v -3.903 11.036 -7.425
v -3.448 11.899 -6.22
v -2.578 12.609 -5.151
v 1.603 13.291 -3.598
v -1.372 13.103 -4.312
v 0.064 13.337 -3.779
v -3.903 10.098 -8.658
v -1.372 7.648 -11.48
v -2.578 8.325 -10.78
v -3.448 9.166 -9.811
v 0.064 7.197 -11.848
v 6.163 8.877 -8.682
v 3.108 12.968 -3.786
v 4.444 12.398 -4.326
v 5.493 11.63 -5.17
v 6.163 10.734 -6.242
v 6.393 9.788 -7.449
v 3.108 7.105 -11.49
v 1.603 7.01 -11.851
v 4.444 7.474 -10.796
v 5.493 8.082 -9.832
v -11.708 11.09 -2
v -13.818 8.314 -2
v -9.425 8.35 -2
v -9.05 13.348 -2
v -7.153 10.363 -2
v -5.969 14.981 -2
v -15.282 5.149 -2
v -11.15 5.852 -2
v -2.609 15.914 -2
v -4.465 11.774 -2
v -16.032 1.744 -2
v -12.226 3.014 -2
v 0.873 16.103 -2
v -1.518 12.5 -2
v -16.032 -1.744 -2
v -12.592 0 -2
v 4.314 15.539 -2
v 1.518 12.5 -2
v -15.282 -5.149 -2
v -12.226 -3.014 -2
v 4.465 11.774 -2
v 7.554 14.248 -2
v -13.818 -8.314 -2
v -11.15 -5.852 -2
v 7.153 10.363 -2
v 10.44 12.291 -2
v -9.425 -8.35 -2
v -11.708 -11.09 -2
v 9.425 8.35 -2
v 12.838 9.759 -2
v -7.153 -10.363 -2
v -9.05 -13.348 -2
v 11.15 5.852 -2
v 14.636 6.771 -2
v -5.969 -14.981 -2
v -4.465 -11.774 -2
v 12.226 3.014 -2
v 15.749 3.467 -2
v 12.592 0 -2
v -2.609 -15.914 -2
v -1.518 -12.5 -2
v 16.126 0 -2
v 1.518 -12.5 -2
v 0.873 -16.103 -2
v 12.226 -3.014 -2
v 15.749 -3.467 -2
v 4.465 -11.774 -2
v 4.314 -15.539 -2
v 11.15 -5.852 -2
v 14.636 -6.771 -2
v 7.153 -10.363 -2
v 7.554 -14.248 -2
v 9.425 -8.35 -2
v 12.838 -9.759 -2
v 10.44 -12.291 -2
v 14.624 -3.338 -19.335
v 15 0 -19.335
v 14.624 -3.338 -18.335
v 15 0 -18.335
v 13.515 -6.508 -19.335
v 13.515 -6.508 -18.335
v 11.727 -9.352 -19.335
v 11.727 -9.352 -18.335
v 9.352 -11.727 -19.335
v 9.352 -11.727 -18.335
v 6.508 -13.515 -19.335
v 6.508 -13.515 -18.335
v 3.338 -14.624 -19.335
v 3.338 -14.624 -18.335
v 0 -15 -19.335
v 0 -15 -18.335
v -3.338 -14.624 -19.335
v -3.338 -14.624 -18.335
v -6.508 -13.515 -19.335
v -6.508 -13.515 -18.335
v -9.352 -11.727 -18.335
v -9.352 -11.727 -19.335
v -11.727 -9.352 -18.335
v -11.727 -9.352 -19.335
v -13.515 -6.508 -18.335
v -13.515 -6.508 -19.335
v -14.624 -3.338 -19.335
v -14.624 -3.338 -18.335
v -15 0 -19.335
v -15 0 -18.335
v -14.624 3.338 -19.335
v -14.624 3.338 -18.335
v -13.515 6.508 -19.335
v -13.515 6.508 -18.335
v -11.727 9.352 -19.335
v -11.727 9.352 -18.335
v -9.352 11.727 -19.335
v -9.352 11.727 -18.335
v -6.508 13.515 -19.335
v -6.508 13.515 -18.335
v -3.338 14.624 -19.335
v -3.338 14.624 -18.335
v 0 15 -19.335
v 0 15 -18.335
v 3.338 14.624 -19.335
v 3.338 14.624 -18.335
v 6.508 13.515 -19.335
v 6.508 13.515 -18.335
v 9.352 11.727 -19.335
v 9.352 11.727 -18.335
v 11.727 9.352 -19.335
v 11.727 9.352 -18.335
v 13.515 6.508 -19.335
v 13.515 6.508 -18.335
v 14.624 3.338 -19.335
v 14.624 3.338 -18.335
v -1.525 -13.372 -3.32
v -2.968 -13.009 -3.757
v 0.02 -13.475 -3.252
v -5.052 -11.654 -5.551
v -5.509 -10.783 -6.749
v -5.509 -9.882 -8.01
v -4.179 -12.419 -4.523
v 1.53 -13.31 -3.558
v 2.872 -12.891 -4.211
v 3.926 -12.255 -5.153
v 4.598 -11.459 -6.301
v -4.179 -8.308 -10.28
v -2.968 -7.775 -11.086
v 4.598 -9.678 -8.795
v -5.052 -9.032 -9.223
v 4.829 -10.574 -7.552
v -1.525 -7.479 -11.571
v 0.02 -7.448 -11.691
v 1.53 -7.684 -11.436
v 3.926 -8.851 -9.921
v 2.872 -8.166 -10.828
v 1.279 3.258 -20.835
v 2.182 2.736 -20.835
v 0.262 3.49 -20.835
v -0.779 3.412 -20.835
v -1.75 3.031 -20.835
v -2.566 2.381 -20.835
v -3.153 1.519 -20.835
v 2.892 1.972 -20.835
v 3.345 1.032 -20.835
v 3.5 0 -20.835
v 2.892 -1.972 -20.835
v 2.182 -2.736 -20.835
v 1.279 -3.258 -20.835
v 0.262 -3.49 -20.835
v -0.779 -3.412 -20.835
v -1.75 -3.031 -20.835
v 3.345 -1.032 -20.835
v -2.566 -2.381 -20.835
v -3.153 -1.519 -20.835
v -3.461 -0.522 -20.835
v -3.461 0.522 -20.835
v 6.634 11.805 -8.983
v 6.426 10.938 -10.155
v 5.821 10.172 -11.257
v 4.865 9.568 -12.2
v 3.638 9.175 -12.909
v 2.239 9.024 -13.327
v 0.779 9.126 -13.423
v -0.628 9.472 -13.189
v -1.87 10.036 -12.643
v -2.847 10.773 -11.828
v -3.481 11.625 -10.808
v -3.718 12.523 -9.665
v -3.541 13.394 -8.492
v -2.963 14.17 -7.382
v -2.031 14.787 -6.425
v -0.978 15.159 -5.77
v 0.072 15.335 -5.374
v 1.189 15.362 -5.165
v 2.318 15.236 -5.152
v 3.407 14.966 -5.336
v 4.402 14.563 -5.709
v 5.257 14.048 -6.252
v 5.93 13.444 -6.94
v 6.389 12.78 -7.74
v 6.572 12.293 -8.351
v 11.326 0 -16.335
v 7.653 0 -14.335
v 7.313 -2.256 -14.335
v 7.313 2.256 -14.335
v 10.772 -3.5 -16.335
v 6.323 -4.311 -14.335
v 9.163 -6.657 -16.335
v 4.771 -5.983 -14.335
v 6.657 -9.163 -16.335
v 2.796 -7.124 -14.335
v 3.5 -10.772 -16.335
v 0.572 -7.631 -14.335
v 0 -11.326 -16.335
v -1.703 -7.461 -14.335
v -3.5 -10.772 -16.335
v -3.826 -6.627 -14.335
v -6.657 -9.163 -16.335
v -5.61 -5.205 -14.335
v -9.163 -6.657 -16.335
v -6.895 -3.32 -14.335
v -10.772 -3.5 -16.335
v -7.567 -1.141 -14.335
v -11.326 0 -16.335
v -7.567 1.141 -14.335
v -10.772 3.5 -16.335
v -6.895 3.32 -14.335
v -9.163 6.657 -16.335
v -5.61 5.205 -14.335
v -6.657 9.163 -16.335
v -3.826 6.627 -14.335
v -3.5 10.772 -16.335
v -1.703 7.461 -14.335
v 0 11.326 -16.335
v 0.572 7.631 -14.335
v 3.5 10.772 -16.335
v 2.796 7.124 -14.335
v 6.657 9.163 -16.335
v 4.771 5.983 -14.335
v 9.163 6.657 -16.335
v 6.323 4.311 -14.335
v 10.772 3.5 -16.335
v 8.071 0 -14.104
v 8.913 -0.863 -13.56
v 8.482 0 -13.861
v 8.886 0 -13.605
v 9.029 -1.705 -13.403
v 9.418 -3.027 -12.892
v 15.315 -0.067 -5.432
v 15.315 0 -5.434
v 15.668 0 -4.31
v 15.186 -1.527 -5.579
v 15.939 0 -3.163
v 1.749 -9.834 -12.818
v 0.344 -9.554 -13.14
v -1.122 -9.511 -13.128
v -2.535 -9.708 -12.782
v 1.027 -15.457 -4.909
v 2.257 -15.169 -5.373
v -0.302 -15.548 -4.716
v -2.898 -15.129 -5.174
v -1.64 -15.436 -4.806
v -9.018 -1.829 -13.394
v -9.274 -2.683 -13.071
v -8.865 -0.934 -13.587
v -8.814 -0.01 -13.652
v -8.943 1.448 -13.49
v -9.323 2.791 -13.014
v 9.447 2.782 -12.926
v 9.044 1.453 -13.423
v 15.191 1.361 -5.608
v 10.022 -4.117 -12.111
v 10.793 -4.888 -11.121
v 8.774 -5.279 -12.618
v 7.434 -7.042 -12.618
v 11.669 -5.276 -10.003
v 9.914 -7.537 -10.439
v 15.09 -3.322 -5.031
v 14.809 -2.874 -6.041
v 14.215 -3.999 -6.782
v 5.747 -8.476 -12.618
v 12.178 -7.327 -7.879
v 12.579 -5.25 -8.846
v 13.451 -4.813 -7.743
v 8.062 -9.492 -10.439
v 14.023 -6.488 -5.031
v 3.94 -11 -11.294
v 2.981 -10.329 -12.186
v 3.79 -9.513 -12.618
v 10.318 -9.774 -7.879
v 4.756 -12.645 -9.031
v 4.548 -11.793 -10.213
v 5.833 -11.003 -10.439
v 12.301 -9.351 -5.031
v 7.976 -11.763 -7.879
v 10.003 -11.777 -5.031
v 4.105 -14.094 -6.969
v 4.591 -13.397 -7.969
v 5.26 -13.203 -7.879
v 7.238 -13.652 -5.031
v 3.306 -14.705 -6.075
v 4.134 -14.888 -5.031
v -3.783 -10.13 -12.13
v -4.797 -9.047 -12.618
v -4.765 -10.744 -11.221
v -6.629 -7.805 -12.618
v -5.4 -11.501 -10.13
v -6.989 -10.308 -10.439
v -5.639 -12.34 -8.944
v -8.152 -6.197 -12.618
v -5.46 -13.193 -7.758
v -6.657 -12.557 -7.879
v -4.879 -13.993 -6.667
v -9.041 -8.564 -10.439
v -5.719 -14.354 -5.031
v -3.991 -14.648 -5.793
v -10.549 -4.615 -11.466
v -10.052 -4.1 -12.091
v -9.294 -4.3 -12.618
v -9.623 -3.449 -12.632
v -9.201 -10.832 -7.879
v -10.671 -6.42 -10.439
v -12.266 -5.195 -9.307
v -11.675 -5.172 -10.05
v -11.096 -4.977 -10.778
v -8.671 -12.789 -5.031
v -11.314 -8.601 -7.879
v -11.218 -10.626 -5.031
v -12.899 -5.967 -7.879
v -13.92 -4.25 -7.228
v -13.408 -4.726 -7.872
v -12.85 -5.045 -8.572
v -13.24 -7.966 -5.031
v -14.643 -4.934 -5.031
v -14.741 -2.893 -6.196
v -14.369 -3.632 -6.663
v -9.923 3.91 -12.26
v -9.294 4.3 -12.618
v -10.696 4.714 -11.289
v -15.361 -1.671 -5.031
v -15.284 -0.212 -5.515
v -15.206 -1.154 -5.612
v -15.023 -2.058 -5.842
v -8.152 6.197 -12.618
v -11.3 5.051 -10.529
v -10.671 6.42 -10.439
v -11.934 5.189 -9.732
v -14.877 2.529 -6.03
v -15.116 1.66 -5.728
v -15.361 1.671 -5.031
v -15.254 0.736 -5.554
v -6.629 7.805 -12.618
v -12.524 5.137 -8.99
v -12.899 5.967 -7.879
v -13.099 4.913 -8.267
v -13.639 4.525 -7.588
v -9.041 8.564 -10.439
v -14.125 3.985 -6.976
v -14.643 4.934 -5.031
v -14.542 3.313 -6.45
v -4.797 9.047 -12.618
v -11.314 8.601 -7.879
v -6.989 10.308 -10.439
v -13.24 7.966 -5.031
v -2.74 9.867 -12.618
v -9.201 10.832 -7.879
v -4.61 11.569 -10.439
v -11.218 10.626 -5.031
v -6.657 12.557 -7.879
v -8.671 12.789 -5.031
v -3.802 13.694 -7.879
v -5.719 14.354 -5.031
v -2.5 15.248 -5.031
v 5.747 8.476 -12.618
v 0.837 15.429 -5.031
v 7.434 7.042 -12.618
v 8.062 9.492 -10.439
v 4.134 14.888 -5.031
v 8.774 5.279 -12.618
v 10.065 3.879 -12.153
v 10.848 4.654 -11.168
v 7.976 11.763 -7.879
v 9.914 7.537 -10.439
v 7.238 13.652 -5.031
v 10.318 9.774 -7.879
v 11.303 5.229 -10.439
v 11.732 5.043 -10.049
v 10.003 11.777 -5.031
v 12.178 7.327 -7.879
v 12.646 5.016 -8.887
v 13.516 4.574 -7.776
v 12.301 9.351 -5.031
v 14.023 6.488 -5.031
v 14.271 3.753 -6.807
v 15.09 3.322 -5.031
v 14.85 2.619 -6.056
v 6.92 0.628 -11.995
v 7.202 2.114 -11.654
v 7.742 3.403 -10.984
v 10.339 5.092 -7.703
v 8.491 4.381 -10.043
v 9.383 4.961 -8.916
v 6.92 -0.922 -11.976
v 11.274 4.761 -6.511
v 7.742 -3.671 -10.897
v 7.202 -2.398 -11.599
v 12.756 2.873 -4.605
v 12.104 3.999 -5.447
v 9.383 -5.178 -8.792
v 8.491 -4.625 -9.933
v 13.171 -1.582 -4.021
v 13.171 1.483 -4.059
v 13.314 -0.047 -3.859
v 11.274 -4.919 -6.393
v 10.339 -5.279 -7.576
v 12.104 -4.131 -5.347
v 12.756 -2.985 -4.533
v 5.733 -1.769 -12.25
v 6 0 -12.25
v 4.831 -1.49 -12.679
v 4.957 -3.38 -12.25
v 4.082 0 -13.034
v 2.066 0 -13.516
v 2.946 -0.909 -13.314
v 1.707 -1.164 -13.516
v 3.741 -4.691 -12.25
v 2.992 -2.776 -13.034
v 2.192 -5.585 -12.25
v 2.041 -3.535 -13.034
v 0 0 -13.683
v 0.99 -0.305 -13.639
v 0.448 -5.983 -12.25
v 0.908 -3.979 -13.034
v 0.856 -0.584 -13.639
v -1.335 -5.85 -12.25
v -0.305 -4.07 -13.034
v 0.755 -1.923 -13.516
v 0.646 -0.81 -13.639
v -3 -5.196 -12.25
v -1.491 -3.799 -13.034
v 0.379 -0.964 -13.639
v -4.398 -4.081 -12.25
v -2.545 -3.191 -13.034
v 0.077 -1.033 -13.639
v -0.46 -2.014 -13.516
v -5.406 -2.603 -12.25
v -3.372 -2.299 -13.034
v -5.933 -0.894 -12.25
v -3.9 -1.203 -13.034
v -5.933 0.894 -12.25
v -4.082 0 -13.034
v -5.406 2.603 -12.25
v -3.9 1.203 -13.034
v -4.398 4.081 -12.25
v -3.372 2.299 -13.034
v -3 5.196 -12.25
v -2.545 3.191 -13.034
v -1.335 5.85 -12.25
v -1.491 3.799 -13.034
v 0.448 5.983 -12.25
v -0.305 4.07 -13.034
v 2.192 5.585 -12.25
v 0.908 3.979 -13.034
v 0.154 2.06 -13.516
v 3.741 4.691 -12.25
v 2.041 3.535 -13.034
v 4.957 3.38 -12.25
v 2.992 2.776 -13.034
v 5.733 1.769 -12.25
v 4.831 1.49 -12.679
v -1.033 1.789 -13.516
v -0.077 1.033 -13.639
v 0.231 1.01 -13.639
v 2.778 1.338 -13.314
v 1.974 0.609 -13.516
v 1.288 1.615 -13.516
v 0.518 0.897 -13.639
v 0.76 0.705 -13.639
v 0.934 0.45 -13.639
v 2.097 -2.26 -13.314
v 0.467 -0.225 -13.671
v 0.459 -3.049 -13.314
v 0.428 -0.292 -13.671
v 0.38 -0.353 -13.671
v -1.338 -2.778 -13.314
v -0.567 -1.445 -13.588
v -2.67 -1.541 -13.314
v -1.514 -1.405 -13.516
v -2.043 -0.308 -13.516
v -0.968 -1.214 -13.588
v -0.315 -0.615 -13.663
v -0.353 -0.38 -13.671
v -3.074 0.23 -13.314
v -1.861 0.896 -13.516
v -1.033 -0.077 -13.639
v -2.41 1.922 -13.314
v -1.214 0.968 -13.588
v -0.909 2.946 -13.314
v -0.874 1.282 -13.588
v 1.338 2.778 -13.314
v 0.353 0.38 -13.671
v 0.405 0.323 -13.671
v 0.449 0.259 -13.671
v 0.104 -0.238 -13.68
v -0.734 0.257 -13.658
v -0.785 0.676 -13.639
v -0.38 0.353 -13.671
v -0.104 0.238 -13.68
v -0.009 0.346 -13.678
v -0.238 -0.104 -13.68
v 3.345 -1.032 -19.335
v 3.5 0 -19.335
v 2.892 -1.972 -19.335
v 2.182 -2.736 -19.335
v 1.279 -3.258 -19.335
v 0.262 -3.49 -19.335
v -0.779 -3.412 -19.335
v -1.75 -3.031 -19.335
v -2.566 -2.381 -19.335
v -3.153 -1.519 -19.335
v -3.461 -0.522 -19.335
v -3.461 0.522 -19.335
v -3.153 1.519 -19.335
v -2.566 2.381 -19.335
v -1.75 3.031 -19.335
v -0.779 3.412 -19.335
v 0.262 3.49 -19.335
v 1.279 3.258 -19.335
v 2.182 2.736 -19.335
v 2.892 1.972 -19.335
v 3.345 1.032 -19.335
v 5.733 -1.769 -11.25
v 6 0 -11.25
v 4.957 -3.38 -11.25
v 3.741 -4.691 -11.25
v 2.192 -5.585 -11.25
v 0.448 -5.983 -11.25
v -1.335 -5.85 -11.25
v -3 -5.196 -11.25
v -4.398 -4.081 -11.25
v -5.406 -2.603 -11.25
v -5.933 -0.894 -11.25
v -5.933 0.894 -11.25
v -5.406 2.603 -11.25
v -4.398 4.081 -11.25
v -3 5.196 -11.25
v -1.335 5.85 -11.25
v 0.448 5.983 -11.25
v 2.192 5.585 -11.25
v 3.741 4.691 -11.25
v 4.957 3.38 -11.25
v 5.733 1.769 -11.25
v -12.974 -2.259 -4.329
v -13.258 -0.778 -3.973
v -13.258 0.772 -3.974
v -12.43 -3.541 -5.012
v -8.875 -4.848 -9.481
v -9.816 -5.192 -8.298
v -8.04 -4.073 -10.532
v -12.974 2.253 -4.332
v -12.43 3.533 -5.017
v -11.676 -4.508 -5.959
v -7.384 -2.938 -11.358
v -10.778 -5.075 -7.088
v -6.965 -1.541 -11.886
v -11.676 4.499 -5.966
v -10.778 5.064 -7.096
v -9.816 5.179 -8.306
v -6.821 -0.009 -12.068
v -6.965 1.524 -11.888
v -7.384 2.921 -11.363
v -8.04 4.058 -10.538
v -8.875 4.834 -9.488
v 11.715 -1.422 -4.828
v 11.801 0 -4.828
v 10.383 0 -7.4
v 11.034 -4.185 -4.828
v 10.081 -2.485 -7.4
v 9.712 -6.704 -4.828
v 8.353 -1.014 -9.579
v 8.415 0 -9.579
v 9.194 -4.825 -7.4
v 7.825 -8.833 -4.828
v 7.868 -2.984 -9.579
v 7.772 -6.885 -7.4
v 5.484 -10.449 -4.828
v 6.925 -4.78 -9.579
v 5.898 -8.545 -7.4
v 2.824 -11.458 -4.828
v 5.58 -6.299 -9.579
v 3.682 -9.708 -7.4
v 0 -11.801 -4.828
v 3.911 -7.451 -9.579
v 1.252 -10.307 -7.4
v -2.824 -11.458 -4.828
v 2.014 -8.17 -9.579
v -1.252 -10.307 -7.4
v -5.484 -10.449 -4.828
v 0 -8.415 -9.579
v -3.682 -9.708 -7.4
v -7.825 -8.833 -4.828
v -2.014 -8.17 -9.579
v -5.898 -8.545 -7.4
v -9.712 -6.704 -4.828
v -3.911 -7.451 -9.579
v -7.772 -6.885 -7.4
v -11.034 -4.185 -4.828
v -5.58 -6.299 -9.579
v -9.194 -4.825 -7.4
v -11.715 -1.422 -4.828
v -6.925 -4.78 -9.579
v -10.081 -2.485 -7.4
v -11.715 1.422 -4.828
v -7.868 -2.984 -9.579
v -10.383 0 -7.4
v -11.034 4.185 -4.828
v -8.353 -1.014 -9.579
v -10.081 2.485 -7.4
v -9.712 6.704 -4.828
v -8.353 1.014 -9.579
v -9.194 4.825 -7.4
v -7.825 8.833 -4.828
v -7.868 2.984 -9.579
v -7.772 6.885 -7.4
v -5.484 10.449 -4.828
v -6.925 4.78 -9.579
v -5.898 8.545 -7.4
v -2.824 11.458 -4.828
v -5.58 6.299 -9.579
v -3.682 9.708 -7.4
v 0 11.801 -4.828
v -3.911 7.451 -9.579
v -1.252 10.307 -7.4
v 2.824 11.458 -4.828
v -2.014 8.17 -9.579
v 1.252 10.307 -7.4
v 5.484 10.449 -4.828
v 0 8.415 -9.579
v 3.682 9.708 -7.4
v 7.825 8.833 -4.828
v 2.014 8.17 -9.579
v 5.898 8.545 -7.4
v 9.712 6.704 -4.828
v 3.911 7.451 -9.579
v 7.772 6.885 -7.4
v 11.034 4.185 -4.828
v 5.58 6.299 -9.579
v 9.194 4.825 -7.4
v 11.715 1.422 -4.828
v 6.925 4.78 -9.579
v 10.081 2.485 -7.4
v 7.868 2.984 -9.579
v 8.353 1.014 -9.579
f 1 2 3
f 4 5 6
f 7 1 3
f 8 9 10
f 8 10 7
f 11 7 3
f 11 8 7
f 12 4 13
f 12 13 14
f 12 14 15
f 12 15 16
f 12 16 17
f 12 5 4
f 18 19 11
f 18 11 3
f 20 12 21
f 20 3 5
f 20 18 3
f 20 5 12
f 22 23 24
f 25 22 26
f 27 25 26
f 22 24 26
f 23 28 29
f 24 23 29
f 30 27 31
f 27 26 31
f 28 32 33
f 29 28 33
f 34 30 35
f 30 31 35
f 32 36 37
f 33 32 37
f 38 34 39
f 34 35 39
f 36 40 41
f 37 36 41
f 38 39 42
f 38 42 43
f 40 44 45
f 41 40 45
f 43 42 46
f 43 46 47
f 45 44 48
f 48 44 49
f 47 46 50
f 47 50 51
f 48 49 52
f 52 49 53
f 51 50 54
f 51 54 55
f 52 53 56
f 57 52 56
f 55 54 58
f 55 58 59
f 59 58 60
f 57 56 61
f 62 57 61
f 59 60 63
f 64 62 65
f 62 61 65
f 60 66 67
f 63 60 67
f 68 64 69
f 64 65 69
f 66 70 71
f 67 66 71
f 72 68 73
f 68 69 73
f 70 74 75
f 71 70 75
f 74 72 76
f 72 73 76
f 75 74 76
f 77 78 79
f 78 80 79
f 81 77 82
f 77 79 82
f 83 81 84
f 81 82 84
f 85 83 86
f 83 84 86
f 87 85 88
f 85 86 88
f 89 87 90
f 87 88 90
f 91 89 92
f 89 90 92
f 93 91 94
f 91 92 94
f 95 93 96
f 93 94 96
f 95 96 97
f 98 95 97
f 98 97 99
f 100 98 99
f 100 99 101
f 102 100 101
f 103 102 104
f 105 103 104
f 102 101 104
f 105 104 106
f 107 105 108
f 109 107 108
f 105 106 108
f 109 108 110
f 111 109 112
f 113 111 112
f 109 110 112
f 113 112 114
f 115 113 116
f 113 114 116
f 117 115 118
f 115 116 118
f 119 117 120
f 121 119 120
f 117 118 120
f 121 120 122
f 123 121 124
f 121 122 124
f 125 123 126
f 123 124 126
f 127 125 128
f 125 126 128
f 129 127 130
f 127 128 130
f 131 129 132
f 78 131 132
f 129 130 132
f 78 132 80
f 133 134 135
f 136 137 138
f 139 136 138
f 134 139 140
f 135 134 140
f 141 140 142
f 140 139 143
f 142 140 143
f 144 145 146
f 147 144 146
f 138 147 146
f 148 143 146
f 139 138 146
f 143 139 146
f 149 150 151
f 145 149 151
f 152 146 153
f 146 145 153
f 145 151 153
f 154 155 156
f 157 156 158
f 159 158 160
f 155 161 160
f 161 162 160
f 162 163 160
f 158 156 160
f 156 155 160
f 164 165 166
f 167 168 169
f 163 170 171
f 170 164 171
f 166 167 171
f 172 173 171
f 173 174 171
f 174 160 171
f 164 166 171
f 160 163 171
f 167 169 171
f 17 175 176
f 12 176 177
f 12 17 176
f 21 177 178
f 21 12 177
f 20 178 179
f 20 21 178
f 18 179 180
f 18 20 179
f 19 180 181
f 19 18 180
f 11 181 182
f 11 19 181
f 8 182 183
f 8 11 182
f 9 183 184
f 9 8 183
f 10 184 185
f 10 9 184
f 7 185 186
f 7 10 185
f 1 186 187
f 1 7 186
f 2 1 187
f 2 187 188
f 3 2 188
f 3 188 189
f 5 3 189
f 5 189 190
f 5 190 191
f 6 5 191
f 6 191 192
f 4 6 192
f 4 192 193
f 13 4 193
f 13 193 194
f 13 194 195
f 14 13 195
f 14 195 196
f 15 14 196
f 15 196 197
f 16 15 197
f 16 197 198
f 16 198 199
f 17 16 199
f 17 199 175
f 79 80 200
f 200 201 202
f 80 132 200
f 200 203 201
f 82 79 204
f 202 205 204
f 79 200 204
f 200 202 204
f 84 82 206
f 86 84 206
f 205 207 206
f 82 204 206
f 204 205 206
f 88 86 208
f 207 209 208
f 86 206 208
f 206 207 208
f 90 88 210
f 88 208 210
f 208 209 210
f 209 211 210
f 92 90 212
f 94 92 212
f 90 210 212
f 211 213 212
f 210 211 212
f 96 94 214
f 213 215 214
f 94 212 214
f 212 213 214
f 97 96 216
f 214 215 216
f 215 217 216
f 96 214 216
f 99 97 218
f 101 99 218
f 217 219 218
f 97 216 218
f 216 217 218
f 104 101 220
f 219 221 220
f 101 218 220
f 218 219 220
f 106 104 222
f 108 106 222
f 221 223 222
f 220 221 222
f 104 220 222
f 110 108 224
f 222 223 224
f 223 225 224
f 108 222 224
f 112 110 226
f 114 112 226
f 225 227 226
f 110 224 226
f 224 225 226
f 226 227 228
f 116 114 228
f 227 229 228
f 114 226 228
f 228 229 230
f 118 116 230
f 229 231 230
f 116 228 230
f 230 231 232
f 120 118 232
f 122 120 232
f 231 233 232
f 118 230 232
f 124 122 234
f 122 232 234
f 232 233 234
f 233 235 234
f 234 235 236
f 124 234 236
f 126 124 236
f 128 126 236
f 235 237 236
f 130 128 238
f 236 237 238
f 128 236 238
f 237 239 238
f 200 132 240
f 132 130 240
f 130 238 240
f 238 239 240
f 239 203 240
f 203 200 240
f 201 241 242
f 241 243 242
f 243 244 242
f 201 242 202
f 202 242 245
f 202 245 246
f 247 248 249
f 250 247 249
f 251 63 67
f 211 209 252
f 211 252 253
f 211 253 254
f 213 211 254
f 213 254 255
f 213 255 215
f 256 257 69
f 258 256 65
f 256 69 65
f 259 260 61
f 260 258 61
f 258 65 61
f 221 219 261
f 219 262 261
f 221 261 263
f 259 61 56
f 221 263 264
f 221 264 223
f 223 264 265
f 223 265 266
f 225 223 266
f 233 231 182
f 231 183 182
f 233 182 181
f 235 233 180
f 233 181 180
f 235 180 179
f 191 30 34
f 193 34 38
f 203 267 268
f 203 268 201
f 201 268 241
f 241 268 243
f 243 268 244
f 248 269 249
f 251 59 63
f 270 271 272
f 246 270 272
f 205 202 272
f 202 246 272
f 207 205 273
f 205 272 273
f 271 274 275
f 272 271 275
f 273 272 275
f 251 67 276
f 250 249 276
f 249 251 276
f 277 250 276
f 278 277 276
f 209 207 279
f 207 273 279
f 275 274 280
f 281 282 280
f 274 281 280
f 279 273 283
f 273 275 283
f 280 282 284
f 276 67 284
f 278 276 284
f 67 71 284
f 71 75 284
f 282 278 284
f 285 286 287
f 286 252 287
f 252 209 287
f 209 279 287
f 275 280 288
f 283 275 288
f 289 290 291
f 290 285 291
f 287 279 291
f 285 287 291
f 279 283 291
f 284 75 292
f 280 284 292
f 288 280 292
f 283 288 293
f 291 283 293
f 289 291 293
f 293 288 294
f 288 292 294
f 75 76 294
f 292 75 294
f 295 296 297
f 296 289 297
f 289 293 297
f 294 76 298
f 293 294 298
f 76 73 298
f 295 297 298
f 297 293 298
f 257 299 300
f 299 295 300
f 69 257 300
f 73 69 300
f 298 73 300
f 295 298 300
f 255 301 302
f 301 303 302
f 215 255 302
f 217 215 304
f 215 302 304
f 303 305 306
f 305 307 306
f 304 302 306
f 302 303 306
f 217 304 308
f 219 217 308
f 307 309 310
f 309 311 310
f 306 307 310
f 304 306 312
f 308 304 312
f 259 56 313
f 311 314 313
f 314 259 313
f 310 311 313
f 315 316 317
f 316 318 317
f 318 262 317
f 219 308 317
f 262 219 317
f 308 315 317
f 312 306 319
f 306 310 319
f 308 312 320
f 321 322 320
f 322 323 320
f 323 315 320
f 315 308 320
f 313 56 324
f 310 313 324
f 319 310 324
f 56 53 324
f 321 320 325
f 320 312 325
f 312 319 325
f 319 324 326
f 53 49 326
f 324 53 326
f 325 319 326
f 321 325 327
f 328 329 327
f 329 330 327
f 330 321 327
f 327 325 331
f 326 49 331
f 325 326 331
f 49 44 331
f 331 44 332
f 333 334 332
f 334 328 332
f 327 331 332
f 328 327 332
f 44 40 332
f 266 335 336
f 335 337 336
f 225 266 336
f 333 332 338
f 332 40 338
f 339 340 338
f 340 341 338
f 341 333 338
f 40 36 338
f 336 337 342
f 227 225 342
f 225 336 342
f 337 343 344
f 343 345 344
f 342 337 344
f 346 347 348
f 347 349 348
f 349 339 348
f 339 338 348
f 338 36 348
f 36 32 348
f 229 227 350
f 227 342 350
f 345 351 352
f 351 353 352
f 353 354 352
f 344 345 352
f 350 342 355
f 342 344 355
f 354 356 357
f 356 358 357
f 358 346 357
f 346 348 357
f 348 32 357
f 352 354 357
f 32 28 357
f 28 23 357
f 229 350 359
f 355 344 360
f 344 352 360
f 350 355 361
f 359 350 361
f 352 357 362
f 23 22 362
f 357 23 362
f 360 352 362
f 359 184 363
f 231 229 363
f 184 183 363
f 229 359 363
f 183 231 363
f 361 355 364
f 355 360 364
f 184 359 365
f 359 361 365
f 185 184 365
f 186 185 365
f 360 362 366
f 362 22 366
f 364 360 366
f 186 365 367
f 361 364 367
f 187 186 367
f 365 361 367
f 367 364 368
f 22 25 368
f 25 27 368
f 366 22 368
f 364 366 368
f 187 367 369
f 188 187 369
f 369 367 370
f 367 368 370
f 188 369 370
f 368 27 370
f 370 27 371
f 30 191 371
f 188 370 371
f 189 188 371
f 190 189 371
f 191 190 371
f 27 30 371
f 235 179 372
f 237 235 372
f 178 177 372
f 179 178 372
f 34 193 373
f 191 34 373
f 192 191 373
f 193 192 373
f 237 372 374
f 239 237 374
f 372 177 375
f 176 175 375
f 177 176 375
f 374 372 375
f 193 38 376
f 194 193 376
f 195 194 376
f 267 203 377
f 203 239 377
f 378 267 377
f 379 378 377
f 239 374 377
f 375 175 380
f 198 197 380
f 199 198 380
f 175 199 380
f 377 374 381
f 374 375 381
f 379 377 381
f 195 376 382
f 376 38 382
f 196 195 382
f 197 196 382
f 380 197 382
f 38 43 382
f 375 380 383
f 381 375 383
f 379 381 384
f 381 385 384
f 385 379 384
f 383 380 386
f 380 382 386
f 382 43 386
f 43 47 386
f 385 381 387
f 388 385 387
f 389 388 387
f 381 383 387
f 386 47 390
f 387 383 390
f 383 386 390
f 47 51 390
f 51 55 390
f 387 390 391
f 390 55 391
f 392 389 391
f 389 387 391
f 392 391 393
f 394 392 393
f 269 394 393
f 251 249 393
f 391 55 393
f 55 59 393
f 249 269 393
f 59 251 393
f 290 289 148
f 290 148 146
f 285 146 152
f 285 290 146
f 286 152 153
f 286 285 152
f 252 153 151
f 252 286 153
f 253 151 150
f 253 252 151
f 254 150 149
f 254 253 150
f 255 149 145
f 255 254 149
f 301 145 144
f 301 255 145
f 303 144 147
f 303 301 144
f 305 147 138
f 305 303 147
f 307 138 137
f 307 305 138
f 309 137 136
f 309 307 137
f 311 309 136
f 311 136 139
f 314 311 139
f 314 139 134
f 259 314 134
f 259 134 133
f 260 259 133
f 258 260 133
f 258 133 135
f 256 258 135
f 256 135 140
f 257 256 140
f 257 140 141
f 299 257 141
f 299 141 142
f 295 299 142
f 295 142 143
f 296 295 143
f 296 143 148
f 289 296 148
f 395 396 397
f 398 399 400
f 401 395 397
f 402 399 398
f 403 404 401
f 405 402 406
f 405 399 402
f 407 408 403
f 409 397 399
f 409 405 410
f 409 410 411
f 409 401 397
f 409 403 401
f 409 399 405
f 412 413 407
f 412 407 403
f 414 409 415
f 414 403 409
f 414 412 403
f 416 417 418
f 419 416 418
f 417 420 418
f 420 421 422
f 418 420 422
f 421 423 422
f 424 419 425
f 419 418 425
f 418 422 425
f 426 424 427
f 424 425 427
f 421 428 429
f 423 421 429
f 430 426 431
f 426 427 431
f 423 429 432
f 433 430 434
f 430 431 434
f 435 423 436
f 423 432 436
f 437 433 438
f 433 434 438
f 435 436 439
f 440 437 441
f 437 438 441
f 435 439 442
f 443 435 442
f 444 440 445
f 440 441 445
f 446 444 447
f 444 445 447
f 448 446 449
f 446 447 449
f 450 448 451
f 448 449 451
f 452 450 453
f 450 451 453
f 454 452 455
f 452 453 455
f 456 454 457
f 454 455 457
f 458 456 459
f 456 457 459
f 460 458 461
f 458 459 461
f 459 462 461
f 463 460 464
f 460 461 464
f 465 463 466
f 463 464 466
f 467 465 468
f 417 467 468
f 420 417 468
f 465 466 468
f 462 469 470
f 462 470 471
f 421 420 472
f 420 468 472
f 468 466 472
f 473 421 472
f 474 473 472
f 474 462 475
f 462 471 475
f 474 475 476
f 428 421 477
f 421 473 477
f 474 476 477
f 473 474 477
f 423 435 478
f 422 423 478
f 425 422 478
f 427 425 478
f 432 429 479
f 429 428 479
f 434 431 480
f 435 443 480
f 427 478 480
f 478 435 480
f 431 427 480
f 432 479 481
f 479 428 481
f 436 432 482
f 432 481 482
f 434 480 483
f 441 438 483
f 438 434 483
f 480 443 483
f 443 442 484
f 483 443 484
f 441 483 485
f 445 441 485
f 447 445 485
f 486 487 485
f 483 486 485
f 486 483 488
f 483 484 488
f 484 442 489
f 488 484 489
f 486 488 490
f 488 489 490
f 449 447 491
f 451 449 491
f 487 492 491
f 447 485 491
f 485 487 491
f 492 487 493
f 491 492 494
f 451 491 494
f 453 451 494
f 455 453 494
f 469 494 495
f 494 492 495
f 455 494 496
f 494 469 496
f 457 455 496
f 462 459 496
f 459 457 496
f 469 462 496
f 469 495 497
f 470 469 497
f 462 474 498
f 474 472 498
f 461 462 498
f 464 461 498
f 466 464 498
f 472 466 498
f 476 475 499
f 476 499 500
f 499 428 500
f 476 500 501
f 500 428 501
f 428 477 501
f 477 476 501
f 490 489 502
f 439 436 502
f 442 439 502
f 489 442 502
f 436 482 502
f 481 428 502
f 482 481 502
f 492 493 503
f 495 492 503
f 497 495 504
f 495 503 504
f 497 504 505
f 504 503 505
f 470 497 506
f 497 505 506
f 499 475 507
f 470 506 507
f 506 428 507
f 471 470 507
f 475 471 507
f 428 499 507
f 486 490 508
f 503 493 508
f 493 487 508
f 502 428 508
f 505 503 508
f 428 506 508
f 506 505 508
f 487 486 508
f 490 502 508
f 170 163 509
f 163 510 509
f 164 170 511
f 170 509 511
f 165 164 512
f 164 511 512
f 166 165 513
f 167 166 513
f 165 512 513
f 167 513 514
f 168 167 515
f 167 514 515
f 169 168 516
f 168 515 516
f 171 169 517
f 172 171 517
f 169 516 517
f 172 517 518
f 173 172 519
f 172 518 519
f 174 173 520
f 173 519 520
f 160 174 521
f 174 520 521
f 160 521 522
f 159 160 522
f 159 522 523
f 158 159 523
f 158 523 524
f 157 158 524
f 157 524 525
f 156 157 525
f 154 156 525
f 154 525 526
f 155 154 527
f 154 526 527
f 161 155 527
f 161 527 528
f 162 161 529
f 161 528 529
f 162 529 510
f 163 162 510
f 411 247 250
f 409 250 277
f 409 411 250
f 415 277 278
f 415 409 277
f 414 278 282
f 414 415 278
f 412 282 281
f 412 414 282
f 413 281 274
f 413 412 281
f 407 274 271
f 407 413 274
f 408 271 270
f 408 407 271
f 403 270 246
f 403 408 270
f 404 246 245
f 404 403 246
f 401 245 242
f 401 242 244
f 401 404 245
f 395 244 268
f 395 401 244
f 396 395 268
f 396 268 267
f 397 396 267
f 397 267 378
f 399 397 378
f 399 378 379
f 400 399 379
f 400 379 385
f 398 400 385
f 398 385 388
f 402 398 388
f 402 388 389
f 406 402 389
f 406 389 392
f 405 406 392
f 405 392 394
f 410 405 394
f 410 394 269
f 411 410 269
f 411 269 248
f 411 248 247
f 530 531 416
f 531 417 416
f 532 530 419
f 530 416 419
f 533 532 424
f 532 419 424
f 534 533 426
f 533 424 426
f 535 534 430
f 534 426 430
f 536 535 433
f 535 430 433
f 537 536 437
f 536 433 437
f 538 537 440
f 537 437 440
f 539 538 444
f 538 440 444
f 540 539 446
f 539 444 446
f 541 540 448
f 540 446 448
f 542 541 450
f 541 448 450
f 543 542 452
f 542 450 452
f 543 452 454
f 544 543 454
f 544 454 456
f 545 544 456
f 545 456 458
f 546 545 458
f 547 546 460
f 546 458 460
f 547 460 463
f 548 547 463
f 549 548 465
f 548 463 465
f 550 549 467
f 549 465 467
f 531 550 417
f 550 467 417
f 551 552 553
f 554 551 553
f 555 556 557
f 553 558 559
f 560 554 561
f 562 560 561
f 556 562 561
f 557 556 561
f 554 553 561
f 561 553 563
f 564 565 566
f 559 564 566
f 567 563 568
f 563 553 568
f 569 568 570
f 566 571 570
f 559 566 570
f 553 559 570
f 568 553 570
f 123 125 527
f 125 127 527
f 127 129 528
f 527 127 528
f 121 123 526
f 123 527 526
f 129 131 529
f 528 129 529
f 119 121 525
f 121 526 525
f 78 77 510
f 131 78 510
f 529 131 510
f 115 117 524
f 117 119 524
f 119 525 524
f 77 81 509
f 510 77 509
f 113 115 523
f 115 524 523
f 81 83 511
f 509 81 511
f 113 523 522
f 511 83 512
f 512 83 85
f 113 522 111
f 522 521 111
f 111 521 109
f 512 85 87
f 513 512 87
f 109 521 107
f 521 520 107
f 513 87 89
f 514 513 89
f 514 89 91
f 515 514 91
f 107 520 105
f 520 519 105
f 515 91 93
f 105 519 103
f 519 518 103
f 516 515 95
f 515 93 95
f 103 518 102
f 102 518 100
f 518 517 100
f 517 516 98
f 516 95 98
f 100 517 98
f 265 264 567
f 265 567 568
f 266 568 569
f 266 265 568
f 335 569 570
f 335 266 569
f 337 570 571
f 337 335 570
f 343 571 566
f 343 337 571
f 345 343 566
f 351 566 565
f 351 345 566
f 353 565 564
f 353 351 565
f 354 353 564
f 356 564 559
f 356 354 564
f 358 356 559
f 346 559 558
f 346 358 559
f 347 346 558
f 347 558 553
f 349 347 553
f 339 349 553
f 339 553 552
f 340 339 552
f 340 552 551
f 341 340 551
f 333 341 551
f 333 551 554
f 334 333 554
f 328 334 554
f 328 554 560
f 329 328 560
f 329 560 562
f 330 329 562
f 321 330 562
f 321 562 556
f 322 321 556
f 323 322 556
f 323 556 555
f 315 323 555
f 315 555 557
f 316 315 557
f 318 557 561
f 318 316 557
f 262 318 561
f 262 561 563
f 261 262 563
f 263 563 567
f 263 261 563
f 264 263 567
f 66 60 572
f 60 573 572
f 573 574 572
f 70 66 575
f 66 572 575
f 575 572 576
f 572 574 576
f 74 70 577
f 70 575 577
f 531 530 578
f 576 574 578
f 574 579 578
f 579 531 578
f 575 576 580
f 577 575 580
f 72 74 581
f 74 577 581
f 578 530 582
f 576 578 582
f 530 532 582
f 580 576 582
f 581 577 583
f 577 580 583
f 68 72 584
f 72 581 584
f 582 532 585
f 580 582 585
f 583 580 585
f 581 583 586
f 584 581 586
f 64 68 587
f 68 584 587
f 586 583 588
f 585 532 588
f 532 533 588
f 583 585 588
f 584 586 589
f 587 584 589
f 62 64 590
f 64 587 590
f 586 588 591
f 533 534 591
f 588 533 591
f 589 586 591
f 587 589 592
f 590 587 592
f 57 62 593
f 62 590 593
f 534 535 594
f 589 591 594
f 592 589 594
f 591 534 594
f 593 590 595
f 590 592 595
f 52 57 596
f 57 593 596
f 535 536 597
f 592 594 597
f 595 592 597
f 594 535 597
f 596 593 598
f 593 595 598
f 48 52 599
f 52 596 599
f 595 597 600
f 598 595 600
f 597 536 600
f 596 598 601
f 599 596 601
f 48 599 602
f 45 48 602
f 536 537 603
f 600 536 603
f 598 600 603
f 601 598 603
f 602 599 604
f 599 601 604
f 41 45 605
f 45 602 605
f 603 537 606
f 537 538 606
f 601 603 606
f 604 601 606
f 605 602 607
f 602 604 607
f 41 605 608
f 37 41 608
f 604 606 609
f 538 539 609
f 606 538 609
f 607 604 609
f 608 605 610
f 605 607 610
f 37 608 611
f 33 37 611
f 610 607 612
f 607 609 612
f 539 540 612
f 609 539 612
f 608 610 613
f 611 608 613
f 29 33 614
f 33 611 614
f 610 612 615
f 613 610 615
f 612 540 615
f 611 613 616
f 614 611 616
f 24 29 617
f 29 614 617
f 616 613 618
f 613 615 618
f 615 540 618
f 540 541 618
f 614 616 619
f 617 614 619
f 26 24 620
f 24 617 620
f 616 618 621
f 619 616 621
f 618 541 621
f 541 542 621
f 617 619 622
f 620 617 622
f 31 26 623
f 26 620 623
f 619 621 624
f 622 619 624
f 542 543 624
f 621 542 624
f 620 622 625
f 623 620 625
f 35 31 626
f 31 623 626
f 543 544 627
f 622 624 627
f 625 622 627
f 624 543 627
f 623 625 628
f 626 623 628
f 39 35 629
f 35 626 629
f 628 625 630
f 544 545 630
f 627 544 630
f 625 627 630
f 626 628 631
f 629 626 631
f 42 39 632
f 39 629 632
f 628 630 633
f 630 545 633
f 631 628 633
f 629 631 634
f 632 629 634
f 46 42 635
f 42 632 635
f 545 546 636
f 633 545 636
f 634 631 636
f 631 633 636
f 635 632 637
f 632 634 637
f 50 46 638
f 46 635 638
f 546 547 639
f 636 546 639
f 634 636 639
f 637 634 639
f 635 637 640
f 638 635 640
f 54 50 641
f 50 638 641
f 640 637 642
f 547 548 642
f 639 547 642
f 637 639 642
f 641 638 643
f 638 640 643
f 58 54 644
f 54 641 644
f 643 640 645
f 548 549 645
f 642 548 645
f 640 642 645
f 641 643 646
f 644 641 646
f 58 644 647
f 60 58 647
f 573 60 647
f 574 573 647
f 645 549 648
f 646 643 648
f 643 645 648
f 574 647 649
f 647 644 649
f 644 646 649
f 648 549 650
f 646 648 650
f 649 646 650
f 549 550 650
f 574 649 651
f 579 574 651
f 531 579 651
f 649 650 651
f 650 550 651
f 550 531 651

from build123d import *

# Parameters (mm, degrees)
F_10_0MM_START                             = 12.85
F_10_0MM_CLEARANCE_DOWEL_HOLE1_OUTLINE_R   = 5.2
F_10_0MM_CLEARANCE_DOWEL_HOLE1_DEPTH       = 3.4
F_10_0MM_CLEARANCE_DOWEL_HOLE1_2_OUTLINE_R = 5.2
F_10_0MM_CLEARANCE_DOWEL_HOLE1_2_DEPTH     = 3.4
F_10_0MM_START_2                           = -16.25
F_10_0MM_CLEARANCE_DOWEL_HOLE1_3_OUTLINE_R = 5.2
F_10_0MM_CLEARANCE_DOWEL_HOLE1_3_DEPTH     = 3.4
F_10_0MM_CLEARANCE_DOWEL_HOLE1_4_OUTLINE_R = 5.2
F_10_0MM_CLEARANCE_DOWEL_HOLE1_4_DEPTH     = 3.4


# Read off the part's stored shape, not the designer's step: Ø10.0mm Clearance Dowel Hole1
with BuildPart() as part:
    # Sketch2 → Revolve1 (revolve)
    with BuildSketch(Plane(origin=(0, 0, 0), x_dir=(1, 0, 0), z_dir=(0, 1, 0))):
        with BuildLine():
            Line((0, 19.335223808), (0, 20.835223808))
            Line((0, 20.835223808), (3.5, 20.835223808))
            Line((3.5, 20.835223808), (3.5, 19.335223808))
            Line((3.5, 19.335223808), (15, 19.335223808))
            Line((15, 19.335223808), (15, 18.335223808))
            Line((15, 18.335223808), (7.652702684, 14.335223808))
            ThreePointArc((7.652702684, 14.335223808), (13.394084623, 9.201141077), (16.126453423, 2))
            Line((16.126453423, 2), (12.592160259, 2))
            ThreePointArc((12.592160259, 2), (10.383050167, 7.399646561), (6, 11.25))
            Line((6, 11.25), (6, 12.25))
            ThreePointArc((6, 12.25), (3.082974877, 13.314034437), (0, 13.683453923))
            Line((0, 13.683453923), (0, 14.335223808))
            Line((0, 14.335223808), (0, 19.335223808))
        make_face()
    revolve(axis=Axis((0, 0, 0), (0, 0, -1)))

    # Ø10.0mm Clearance Dowel Hole1 outline → Ø10.0mm Clearance Dowel Hole1 (cut)
    with BuildSketch(Plane(origin=(0, 0, 0), x_dir=(0.6183381372049325, 0.009621176242523823, 0.7858532821370949), z_dir=(0.7859121758046087, -0.0075697264639421865, -0.6182918009834247)).offset(F_10_0MM_START)):
        Circle(F_10_0MM_CLEARANCE_DOWEL_HOLE1_OUTLINE_R)
    extrude(amount=F_10_0MM_CLEARANCE_DOWEL_HOLE1_DEPTH, mode=Mode.SUBTRACT)

    # 10.0mm Clearance Dowel Hole1 2 outline → 10.0mm Clearance Dowel Hole1 2 (cut)
    with BuildSketch(Plane(origin=(0, 0, 0), x_dir=(0.9955100285365741, -0.07532499424889044, 0.05732301740587202), z_dir=(0.094656130721202, 0.792202117315513, -0.602873139422971)).offset(F_10_0MM_START)):
        Circle(F_10_0MM_CLEARANCE_DOWEL_HOLE1_2_OUTLINE_R)
    extrude(amount=F_10_0MM_CLEARANCE_DOWEL_HOLE1_2_DEPTH, mode=Mode.SUBTRACT)

    # 10.0mm Clearance Dowel Hole1 3 outline → 10.0mm Clearance Dowel Hole1 3 (cut)
    with BuildSketch(Plane(origin=(0, 0, 0), x_dir=(0.6223977246894614, -0.0005766674334576965, -0.7827009261244378), z_dir=(0.7827011385588891, 0.00045856135989200104, 0.6223975557632742)).offset(F_10_0MM_START_2)):
        Circle(F_10_0MM_CLEARANCE_DOWEL_HOLE1_3_OUTLINE_R)
    extrude(amount=F_10_0MM_CLEARANCE_DOWEL_HOLE1_3_DEPTH, mode=Mode.SUBTRACT)

    # 10.0mm Clearance Dowel Hole1 4 outline → 10.0mm Clearance Dowel Hole1 4 (cut)
    with BuildSketch(Plane(origin=(0, 0, 0), x_dir=(0.9995880641663693, -0.02335534361896009, -0.0166802248357377), z_dir=(0.02870020864262942, 0.8134339024051715, 0.5809488655998595)).offset(F_10_0MM_START_2)):
        Circle(F_10_0MM_CLEARANCE_DOWEL_HOLE1_4_OUTLINE_R)
    extrude(amount=F_10_0MM_CLEARANCE_DOWEL_HOLE1_4_DEPTH, mode=Mode.SUBTRACT)


solid = part.part
